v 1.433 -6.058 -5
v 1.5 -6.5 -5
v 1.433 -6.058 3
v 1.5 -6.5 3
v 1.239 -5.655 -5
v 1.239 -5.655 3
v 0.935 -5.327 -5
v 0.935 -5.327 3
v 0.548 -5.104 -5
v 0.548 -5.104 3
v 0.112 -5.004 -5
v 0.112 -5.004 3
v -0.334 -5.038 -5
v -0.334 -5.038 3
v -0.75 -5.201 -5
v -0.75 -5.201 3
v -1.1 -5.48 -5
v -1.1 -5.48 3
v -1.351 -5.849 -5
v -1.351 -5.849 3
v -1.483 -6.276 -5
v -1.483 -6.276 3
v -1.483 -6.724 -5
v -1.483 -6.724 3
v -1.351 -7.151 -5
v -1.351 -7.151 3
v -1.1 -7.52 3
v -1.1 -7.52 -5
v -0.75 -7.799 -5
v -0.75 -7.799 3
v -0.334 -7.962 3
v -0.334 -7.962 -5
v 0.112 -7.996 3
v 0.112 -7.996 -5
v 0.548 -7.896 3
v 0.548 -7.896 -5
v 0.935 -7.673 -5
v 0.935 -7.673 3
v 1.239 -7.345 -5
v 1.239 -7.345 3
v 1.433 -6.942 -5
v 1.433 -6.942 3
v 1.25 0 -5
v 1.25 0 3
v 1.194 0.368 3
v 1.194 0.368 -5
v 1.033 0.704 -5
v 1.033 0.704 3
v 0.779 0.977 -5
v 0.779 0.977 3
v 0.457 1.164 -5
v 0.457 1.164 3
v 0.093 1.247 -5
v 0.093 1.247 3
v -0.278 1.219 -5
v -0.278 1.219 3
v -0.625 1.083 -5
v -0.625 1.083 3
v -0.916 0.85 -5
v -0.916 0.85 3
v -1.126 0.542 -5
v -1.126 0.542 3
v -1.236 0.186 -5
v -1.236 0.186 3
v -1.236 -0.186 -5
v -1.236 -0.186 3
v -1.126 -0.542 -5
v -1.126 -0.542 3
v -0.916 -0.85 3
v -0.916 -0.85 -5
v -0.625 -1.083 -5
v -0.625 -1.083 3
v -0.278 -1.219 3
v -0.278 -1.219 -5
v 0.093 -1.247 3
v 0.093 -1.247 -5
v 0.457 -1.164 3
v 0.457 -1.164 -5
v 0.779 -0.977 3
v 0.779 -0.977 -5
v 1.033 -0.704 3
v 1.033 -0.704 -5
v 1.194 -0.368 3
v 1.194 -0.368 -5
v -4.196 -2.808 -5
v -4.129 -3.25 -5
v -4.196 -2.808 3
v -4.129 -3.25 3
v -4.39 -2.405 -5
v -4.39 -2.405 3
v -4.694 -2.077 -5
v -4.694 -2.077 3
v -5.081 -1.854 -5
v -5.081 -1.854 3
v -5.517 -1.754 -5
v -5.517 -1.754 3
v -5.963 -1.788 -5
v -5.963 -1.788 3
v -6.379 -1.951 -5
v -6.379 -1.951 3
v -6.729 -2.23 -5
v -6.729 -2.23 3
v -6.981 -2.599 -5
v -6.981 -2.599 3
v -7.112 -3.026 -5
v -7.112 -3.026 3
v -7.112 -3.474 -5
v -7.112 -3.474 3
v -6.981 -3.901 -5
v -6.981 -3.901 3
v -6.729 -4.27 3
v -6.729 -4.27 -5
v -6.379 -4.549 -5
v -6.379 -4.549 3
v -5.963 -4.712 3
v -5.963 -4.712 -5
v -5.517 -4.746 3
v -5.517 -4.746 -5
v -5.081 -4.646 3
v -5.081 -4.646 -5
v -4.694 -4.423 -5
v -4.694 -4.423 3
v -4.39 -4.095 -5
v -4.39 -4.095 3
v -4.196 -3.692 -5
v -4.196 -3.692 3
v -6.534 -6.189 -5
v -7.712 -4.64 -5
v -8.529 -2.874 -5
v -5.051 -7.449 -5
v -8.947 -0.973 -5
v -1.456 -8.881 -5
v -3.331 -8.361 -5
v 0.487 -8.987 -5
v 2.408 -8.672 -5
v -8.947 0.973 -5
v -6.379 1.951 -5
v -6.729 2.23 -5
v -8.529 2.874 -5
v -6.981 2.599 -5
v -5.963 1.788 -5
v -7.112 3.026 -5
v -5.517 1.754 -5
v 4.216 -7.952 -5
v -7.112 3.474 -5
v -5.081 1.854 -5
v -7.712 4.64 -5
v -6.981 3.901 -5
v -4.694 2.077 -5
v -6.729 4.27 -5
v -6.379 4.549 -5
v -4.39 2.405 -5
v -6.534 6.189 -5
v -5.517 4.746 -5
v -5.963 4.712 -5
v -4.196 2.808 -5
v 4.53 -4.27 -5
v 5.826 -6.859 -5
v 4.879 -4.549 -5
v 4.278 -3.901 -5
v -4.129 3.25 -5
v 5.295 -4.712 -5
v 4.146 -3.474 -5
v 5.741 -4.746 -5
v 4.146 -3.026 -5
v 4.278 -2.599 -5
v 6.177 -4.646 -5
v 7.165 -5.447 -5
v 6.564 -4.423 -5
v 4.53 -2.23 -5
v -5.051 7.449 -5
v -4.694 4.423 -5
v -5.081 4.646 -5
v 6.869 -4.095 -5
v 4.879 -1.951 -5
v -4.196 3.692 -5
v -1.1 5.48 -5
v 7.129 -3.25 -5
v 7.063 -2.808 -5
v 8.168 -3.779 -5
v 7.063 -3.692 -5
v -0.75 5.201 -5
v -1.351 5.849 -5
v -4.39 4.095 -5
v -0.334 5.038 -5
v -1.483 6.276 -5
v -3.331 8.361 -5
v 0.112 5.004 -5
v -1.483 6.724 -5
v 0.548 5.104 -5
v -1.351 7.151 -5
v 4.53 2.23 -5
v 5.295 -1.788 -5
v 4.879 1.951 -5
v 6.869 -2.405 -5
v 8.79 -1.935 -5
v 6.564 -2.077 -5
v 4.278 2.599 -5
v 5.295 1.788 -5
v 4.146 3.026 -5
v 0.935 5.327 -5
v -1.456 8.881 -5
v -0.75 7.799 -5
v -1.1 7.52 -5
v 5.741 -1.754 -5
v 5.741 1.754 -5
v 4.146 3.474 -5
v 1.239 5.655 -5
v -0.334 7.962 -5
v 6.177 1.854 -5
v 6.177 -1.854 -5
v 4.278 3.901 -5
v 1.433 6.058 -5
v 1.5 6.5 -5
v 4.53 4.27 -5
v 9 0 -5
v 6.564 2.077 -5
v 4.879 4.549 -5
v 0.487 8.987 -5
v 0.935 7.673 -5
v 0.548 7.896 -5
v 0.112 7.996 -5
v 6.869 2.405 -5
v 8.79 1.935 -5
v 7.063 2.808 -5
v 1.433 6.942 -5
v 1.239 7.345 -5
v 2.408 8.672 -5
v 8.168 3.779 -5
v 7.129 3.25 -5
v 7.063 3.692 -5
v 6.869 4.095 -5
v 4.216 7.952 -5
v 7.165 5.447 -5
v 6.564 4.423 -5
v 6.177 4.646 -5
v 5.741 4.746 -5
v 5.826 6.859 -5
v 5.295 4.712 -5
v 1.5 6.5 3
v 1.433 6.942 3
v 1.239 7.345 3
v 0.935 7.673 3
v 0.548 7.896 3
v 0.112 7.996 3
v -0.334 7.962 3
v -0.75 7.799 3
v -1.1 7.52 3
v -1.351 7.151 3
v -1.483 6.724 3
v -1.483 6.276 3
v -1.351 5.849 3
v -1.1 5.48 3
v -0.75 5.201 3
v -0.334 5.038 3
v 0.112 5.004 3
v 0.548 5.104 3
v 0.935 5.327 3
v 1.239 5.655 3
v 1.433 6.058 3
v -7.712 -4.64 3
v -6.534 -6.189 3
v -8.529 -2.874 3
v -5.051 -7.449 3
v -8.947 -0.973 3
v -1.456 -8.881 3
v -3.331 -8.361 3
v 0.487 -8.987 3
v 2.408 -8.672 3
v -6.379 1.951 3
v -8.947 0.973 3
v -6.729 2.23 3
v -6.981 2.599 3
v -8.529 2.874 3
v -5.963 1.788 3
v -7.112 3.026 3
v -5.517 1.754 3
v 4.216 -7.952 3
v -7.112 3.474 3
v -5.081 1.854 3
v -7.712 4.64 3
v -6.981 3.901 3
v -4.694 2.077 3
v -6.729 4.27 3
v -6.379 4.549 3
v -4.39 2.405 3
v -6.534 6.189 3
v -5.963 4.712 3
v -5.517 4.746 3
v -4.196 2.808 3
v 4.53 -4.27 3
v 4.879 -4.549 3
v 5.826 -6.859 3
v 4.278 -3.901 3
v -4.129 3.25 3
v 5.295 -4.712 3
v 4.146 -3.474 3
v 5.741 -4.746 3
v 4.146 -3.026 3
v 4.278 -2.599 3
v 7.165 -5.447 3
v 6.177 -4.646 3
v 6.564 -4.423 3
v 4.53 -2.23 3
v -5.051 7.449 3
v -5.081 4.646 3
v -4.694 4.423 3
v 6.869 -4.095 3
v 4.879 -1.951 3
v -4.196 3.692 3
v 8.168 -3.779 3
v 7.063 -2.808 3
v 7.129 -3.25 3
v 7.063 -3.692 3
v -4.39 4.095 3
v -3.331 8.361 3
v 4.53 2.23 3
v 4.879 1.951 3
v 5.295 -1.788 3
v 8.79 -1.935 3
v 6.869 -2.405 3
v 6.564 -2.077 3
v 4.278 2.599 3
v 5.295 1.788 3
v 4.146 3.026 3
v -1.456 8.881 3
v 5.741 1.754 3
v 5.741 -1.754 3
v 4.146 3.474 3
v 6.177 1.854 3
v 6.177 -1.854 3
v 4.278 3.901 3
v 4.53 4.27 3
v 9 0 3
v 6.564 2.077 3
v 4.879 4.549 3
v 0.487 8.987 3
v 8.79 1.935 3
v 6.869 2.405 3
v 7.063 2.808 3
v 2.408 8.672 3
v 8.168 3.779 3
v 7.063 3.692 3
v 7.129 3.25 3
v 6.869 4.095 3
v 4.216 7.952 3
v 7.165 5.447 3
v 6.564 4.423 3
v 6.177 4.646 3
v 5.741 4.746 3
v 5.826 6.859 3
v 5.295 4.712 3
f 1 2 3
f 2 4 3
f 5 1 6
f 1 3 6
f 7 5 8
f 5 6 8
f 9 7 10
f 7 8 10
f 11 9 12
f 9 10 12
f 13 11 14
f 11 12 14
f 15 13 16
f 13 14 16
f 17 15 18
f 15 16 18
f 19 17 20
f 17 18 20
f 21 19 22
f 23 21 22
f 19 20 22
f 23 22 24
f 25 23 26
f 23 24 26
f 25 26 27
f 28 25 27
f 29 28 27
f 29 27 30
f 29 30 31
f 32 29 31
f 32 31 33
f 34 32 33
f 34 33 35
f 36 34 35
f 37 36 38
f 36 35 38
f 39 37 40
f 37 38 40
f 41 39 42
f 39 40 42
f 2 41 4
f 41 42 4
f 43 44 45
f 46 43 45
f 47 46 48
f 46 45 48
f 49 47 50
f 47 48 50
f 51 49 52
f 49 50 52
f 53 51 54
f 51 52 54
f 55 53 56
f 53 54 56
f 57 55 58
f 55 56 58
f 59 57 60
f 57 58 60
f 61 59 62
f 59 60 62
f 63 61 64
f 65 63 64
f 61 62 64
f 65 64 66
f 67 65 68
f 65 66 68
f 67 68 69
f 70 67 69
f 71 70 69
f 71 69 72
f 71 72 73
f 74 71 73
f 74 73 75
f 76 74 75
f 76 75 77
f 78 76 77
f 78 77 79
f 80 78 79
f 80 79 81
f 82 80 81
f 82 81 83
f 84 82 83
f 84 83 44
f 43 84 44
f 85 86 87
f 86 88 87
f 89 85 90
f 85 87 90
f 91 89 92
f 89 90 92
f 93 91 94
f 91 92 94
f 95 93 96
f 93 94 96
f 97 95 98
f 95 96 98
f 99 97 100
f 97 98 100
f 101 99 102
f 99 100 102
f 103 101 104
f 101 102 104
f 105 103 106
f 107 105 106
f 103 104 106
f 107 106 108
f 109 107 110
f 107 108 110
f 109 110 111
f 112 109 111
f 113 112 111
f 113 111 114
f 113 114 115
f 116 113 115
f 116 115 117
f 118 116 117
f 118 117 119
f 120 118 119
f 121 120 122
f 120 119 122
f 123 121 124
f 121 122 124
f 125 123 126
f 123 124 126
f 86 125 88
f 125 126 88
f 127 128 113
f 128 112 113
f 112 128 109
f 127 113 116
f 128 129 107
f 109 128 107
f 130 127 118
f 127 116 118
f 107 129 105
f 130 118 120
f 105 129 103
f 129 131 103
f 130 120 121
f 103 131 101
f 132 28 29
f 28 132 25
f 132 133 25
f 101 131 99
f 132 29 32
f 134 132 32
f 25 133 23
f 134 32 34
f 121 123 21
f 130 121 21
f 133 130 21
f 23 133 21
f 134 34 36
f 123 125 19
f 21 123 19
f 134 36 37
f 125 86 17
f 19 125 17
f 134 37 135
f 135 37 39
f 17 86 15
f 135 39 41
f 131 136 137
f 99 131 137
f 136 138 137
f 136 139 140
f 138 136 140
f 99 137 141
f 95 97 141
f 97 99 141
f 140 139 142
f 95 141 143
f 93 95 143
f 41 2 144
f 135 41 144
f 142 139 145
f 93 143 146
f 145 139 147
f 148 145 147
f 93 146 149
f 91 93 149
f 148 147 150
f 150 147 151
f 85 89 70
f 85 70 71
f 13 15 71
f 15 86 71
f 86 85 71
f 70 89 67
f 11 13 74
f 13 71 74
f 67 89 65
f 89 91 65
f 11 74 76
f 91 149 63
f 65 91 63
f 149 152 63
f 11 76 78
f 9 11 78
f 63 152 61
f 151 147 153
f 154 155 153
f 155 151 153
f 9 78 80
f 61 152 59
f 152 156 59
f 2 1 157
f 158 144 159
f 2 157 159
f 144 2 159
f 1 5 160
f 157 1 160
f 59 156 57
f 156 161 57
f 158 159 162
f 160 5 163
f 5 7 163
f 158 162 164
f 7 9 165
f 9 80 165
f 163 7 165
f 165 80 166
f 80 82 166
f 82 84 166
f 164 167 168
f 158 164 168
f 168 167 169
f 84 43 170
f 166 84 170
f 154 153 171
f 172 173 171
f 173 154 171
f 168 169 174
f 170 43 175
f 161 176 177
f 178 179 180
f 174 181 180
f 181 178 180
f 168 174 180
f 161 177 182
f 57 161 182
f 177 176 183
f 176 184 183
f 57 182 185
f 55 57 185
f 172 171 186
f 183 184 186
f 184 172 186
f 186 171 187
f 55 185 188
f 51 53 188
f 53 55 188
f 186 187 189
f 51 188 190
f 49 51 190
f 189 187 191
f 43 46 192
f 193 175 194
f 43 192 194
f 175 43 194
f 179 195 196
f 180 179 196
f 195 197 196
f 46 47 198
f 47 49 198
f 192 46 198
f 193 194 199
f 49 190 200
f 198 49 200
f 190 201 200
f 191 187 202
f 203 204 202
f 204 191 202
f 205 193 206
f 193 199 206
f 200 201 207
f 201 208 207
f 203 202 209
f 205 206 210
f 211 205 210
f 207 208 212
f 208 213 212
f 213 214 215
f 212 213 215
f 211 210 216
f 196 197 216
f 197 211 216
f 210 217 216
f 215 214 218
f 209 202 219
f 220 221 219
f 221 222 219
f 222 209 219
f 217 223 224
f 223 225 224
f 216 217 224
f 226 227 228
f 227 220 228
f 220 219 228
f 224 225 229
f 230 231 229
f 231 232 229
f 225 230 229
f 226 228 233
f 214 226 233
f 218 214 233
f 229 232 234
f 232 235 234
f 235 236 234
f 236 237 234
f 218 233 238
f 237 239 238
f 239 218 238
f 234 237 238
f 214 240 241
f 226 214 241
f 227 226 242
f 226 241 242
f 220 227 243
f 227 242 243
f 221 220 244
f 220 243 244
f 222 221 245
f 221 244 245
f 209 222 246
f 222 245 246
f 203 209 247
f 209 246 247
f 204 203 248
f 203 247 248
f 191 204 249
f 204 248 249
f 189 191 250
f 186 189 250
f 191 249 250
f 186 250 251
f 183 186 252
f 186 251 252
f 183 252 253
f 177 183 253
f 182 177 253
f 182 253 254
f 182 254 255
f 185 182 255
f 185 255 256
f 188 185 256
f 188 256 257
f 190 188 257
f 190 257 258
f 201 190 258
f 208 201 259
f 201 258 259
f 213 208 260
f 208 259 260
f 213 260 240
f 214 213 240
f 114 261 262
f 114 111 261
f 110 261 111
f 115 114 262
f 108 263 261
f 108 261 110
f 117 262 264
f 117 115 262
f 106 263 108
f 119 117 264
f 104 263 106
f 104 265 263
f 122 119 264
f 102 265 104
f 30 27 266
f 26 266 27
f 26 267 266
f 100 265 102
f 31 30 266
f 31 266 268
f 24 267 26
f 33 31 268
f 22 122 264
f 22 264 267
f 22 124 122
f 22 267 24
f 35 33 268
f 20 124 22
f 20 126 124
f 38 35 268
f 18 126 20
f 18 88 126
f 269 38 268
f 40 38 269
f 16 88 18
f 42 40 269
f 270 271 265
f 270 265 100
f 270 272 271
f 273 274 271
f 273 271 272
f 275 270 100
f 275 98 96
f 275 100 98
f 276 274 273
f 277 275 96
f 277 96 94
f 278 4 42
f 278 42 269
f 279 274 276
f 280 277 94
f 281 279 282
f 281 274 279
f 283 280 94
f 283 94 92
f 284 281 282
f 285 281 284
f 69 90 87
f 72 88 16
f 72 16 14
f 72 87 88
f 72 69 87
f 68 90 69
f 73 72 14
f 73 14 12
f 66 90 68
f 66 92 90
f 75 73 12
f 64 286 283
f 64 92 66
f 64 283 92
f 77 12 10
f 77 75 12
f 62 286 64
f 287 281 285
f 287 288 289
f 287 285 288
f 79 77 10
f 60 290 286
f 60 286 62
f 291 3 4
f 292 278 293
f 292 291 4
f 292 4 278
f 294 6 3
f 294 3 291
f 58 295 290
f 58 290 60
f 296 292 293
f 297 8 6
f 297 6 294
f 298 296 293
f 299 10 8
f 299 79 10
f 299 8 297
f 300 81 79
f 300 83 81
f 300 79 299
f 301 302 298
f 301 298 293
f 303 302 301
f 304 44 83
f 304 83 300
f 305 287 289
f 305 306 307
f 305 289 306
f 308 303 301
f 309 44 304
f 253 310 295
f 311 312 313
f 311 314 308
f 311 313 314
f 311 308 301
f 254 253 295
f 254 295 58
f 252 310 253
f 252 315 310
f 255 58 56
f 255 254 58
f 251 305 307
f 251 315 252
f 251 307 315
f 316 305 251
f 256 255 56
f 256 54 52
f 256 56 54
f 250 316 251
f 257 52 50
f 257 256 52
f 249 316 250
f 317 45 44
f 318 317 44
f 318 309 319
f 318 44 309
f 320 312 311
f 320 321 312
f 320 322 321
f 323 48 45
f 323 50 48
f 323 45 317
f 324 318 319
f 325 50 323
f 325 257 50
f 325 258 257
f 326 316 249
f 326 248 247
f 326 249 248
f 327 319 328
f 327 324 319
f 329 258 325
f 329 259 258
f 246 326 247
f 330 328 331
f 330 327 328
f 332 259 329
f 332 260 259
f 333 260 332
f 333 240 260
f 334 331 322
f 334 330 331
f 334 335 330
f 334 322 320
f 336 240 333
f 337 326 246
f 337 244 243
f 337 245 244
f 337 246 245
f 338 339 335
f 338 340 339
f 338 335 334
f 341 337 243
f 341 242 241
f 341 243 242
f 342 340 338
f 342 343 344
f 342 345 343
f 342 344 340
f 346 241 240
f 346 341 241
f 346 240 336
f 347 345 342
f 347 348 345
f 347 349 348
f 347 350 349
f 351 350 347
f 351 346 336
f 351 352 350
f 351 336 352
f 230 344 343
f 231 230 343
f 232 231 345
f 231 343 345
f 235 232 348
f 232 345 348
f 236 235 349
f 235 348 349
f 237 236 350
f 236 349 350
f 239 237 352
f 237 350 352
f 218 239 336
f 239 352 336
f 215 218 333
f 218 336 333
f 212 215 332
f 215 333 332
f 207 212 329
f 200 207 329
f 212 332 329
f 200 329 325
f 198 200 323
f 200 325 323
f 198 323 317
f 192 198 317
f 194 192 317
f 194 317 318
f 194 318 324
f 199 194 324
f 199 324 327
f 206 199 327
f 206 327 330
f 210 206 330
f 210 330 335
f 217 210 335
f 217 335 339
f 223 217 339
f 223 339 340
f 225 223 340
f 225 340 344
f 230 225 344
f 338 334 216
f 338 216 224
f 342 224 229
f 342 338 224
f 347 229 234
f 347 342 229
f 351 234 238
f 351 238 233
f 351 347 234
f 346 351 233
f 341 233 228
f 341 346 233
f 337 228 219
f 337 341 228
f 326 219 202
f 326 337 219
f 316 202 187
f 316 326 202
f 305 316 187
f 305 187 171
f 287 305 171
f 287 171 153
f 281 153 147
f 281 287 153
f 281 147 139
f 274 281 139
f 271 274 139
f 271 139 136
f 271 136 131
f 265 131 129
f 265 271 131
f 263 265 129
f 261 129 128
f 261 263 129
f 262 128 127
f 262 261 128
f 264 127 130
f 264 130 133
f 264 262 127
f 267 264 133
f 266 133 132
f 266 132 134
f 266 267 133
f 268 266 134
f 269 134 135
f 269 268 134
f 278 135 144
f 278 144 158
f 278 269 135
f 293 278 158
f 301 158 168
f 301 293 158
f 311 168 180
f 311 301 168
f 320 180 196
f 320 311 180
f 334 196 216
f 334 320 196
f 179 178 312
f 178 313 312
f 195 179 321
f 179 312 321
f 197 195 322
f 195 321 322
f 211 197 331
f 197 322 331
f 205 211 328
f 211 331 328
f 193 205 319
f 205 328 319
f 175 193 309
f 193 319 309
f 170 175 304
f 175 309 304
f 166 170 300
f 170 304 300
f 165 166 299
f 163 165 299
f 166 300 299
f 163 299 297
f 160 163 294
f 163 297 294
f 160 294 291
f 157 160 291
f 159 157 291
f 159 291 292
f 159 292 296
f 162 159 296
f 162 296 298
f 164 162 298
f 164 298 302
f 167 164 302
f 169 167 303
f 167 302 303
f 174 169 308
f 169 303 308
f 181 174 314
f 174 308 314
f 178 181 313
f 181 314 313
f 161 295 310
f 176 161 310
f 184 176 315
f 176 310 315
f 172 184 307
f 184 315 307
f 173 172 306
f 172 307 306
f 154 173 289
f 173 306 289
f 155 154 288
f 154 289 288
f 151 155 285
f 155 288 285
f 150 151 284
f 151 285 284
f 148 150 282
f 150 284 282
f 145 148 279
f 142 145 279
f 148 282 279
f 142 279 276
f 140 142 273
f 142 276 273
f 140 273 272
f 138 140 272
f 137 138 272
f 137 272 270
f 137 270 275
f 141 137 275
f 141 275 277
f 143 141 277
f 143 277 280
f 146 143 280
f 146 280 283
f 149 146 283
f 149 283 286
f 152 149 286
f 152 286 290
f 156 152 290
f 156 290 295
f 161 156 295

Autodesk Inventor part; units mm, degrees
ref_plane "YZ Plane" through (0, 0, 0) normal (1, 0, 0) x (0, 1, 0)
ref_plane "XZ Plane" through (0, 0, 0) normal (0, 1, 0) x (-1, 0, 0)
ref_plane "XY Plane" through (0, 0, 0) normal (0, 0, 1) x (1, 0, 0)
sketch "Sketch1" plane through (0, 0, 0) normal (0, 0, 1) x (1, 0, 0)
  circle A0 centre (0, 0) radius 4 projected
  circle A1 centre (0, 0) radius 9
  point P0 (0, 0)
  dimension "d0" = 18
extrude "Extrusion1" add sketch "Sketch1" along normal blind 3 and the other way blind 5 contours A0 | A1
sketch "Sketch2" plane through (0, 0, 3) normal (0, 0, 1) x (1, 0, 0)
  circle A0 centre (0, 0) radius 6.5 construction
  circle A1 centre (0, 6.5) radius 1.5
  circle A2 centre (-5.6292, 3.25) radius 1.5
  circle A3 centre (-5.6292, -3.25) radius 1.5
  circle A4 centre (0, -6.5) radius 1.5
  circle A5 centre (5.6292, -3.25) radius 1.5
  circle A6 centre (5.6292, 3.25) radius 1.5
  dimension "d5" = 13
  dimension "d6" = 3
  dimension "d9" = 360
extrude "Extrusion2" cut sketch "Sketch2" against normal through all
sketch "Sketch3" plane through (0, 0, 3) normal (0, 0, 1) x (1, 0, 0)
  circle A0 centre (0, 0) radius 1.25
  dimension "d13" = 2.5
extrude "Extrusion3" cut sketch "Sketch3" against normal through all
properties part number "servo shaft flange"
